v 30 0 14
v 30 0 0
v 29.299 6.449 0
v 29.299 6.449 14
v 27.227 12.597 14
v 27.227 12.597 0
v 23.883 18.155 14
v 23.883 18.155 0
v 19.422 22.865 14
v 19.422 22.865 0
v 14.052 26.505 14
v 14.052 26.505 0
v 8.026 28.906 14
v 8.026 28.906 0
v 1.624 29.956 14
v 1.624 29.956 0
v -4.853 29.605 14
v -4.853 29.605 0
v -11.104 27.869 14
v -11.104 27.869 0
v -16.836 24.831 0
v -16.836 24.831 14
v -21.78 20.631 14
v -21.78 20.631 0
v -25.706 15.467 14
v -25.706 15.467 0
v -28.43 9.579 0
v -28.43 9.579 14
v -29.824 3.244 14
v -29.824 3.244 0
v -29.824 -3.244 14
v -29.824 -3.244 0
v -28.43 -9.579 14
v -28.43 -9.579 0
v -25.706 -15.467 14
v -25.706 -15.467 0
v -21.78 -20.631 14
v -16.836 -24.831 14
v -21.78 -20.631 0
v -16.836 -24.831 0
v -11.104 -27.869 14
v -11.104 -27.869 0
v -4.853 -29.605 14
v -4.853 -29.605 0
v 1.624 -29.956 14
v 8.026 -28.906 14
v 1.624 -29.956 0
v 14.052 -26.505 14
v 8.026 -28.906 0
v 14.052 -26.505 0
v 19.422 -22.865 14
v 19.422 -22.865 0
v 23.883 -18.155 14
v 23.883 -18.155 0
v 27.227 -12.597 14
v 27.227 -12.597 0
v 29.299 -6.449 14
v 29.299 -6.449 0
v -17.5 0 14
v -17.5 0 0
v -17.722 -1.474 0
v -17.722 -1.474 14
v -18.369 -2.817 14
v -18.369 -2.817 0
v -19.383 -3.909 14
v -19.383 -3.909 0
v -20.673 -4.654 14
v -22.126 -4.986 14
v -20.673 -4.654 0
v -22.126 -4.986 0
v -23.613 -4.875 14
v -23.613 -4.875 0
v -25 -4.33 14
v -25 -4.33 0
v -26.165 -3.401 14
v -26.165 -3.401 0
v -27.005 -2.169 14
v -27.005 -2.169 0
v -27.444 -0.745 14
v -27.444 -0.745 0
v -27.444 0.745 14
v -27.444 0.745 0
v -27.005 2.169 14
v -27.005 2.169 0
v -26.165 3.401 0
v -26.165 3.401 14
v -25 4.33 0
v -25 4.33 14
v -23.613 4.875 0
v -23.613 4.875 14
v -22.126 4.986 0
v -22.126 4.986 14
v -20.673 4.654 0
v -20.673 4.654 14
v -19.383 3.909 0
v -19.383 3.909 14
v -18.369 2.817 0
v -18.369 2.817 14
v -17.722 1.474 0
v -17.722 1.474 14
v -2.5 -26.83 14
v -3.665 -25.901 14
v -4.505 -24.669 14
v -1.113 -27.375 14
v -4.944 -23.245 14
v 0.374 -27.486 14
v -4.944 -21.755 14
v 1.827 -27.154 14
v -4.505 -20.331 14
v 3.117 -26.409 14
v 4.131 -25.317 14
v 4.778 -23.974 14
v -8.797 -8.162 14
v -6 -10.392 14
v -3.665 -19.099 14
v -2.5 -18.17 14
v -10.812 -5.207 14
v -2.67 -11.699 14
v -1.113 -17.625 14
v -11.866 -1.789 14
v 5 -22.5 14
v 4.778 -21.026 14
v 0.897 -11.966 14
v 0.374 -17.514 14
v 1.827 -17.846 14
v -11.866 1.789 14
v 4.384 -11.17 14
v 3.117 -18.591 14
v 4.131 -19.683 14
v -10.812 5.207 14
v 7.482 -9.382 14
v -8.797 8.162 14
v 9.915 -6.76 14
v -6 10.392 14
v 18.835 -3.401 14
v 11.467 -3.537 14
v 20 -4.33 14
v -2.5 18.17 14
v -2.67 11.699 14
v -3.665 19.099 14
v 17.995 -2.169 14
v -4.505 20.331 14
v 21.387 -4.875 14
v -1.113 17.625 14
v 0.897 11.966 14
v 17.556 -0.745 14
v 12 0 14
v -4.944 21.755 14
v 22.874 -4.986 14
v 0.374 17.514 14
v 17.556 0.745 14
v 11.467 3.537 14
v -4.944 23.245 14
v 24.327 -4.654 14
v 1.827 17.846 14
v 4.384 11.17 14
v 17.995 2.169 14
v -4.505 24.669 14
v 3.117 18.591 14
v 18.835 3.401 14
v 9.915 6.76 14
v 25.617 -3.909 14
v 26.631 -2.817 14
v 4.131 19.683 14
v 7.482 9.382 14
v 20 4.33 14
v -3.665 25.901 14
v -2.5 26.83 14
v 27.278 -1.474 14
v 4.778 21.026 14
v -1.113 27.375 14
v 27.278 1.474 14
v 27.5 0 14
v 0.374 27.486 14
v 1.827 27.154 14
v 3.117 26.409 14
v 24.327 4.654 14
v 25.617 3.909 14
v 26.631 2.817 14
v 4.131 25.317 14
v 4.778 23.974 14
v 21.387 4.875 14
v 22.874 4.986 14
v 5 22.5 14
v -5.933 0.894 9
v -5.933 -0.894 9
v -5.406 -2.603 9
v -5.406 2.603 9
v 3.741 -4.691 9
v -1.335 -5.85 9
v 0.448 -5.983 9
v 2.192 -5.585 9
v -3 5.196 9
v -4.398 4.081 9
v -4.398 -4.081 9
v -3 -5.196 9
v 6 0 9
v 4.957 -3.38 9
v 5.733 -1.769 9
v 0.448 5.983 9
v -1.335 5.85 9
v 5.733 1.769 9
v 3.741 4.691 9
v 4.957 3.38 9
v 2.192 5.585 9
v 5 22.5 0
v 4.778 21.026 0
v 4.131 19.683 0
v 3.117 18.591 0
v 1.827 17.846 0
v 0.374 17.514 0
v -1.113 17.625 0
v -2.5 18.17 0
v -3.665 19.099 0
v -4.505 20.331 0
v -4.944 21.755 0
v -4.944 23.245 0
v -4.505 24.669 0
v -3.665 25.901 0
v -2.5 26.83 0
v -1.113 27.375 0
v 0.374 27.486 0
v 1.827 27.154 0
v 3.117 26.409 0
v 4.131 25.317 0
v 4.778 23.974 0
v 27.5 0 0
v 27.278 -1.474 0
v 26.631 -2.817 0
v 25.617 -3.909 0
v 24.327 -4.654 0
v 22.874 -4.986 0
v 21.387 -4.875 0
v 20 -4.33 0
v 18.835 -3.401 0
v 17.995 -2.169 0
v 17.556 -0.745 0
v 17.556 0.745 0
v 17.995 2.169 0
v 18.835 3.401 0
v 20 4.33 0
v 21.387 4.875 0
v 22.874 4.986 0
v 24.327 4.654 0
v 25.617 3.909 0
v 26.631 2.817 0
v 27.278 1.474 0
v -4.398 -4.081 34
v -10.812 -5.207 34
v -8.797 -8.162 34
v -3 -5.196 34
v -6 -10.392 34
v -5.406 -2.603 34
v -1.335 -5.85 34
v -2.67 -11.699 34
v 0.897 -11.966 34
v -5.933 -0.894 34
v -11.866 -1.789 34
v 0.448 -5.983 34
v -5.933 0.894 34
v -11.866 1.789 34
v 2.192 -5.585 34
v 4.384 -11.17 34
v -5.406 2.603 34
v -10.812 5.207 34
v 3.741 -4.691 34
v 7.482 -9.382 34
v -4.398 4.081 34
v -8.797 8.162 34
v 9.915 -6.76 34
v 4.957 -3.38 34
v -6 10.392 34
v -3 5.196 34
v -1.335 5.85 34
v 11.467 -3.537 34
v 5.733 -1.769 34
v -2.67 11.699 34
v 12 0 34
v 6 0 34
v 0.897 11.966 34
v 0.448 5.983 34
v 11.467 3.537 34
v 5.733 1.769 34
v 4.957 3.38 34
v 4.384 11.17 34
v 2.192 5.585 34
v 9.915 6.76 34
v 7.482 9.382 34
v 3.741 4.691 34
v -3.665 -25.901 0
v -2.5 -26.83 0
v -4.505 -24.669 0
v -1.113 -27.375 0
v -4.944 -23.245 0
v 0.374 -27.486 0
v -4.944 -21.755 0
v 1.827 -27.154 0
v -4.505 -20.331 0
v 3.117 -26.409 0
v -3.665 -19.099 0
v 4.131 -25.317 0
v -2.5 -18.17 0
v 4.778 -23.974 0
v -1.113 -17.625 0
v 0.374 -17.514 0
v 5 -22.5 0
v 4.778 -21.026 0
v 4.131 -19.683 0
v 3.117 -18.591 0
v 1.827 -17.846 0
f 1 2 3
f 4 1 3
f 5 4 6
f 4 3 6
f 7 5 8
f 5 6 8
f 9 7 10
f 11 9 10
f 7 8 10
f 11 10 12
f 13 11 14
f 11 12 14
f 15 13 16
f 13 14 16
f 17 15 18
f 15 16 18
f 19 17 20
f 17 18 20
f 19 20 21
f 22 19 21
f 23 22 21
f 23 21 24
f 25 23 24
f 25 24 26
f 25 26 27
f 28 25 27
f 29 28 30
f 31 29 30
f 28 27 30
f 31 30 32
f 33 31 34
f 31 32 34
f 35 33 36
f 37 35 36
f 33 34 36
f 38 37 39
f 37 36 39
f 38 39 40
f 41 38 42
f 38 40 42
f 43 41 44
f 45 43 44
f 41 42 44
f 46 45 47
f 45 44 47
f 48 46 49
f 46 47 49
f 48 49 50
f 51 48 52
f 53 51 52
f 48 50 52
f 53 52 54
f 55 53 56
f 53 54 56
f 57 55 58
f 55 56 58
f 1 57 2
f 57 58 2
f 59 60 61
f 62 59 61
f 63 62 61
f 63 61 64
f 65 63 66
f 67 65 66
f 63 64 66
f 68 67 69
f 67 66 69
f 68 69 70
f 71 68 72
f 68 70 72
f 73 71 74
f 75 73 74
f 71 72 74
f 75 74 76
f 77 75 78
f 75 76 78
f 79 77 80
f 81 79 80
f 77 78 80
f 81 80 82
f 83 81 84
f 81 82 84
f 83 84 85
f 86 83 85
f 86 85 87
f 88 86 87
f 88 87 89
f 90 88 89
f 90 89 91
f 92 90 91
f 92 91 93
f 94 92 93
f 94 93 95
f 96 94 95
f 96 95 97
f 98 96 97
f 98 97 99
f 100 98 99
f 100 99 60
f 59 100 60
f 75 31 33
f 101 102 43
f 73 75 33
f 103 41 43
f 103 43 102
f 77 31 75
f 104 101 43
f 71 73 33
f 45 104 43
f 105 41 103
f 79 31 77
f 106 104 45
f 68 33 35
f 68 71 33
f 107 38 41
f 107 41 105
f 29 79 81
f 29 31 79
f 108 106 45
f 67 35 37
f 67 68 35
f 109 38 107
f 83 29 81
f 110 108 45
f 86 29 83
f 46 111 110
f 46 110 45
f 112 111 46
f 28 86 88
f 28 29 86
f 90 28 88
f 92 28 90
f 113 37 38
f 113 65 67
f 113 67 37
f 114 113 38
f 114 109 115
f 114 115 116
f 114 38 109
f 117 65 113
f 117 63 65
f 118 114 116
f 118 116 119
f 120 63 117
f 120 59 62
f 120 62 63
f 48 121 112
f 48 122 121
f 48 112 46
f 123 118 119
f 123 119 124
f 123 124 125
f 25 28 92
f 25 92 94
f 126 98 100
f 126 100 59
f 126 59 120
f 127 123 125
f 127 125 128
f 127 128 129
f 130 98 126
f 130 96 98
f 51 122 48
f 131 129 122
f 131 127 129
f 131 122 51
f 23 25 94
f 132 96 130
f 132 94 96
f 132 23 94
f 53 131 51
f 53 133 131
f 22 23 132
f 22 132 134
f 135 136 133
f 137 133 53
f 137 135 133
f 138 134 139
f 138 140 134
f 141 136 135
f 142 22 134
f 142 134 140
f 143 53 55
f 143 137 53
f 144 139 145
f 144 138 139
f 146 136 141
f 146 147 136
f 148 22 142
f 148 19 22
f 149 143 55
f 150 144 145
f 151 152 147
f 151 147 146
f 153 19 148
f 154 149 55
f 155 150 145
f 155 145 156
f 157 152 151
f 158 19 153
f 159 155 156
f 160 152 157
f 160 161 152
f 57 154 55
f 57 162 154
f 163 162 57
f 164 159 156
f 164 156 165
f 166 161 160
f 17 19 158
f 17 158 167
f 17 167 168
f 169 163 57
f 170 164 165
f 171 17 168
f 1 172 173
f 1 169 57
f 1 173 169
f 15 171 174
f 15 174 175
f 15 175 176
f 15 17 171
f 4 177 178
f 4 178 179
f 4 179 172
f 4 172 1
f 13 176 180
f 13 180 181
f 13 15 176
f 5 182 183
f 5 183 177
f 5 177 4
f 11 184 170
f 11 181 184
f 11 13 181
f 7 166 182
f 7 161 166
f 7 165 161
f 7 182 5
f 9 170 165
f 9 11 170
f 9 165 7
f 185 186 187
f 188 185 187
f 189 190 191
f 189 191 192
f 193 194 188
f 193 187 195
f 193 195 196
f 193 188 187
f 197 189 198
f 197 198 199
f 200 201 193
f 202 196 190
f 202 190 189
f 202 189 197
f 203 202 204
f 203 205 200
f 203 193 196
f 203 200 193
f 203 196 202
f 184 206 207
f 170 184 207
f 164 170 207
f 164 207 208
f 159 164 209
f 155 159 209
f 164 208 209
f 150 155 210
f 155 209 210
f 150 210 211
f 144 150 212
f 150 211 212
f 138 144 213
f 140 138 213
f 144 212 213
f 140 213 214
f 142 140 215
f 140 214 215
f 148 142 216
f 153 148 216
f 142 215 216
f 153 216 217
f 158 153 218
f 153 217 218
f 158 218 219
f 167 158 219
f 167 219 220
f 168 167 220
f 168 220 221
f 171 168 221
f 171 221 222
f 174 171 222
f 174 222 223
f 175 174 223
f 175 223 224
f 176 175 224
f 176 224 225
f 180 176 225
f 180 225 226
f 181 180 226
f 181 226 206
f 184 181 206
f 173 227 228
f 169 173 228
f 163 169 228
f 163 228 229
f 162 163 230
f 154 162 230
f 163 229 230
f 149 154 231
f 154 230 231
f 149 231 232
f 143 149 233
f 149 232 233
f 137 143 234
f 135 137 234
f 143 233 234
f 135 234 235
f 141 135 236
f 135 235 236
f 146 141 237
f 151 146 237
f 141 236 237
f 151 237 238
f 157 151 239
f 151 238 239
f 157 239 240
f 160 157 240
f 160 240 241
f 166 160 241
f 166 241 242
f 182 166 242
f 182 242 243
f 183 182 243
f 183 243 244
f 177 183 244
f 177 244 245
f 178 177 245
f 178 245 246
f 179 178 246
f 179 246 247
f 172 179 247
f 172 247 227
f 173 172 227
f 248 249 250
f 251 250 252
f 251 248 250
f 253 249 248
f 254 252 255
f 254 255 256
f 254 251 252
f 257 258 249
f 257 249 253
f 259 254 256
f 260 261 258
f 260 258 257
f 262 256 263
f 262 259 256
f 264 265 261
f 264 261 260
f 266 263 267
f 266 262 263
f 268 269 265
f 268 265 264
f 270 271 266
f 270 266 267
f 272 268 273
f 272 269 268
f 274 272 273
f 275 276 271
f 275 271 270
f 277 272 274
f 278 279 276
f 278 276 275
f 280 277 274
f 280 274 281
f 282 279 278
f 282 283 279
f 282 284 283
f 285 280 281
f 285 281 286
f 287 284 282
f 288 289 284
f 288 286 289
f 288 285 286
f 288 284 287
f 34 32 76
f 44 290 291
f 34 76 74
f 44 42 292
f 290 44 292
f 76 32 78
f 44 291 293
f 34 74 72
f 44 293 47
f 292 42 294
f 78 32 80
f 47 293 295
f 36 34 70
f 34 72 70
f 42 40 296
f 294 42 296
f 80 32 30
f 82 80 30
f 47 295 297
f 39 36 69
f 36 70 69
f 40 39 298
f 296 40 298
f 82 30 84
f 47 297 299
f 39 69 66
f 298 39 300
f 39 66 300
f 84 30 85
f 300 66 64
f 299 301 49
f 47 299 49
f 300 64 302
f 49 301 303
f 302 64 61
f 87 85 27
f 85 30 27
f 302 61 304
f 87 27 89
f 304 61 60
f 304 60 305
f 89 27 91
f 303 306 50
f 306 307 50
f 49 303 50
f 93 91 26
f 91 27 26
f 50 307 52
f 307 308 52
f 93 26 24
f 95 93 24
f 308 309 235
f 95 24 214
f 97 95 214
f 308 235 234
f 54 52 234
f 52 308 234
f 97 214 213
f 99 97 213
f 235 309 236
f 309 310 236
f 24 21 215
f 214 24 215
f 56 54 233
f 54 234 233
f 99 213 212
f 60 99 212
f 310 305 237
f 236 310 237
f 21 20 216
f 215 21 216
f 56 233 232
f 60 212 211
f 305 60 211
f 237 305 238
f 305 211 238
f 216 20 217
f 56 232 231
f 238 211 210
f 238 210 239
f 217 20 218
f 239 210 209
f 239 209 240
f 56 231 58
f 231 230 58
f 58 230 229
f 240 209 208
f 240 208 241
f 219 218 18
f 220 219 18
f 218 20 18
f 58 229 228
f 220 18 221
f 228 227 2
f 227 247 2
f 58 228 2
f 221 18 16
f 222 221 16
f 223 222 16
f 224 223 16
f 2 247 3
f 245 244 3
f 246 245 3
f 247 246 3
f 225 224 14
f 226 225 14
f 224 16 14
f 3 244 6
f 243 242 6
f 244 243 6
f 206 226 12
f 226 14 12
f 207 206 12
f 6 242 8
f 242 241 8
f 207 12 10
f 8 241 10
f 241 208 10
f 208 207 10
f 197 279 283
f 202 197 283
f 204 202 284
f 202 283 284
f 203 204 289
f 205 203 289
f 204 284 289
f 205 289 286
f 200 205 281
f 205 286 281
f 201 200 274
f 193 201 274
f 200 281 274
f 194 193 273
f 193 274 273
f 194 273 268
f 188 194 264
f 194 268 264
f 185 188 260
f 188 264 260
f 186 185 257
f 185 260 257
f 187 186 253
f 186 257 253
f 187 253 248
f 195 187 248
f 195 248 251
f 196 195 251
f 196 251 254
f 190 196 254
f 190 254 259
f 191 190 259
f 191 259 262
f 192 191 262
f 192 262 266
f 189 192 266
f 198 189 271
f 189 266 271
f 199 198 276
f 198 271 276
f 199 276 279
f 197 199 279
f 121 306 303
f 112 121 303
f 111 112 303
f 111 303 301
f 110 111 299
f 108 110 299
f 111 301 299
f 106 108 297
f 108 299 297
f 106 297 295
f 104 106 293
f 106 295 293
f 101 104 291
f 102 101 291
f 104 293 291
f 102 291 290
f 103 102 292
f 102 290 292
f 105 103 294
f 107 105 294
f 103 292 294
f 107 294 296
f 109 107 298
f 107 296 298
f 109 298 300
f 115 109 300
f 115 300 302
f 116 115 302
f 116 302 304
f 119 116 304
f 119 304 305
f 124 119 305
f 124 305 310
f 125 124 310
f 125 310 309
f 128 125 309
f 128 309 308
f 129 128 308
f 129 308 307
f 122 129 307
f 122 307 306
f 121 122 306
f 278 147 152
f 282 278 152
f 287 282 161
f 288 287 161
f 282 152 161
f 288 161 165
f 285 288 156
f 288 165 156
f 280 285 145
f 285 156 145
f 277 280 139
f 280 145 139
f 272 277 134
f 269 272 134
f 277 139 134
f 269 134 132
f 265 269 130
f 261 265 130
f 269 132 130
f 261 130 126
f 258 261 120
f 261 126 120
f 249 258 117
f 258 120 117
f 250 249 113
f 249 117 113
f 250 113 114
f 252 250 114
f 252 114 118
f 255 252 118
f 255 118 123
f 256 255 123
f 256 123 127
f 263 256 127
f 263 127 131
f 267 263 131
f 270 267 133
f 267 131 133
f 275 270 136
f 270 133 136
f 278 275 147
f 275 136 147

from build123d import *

# Parameters (mm, degrees)
F0_R      = 30
F1_DEPTH  = 14
F2_R      = 12
F3_DEPTH  = 20
F4_R      = 6
F5_DEPTH  = 25
F6_R      = 5
F7_DEPTH  = 34.001
F8_R      = 5
F9_DEPTH  = 34.001
F10_R     = 5
F11_DEPTH = 34.001
F12_R     = 5
F13_DEPTH = 34.001


with BuildPart() as f1:
    # F0 (on Top) → F1 (new body)
    with BuildSketch(Plane.XY):
        Circle(F0_R)
    extrude(amount=F1_DEPTH)

    # F2 (on face) → F3 (join)
    with BuildSketch(Plane.XY.offset(14)):
        Circle(F2_R)
    extrude(amount=F3_DEPTH)

    # F4 (on face) → F5 (cut)
    with BuildSketch(Plane.XY.offset(34)):
        Circle(F4_R)
    extrude(amount=-F5_DEPTH, mode=Mode.SUBTRACT)

    # F6 (on face) → F7 (cut, through all)
    with BuildSketch(Plane(origin=(0, 0, 0), x_dir=(1, 0, 0), z_dir=(0, 0, -1))):
        with Locations((0, -22.5)):
            Circle(F6_R)
    extrude(amount=-F7_DEPTH, mode=Mode.SUBTRACT)

    # F8 (on face) → F9 (cut, through all)
    with BuildSketch(Plane(origin=(0, 0, 0), x_dir=(1, 0, 0), z_dir=(0, 0, -1))):
        with Locations((0, 22.5)):
            Circle(F8_R)
    extrude(amount=-F9_DEPTH, mode=Mode.SUBTRACT)

    # F10 (on face) → F11 (cut, through all)
    with BuildSketch(Plane(origin=(0, 0, 0), x_dir=(1, 0, 0), z_dir=(0, 0, -1))):
        with Locations((-22.5, 0)):
            Circle(F10_R)
    extrude(amount=-F11_DEPTH, mode=Mode.SUBTRACT)

    # F12 (on face) → F13 (cut, through all)
    with BuildSketch(Plane(origin=(0, 0, 0), x_dir=(1, 0, 0), z_dir=(0, 0, -1))):
        with Locations((22.5, 0)):
            Circle(F12_R)
    extrude(amount=-F13_DEPTH, mode=Mode.SUBTRACT)


solid = f1.part
